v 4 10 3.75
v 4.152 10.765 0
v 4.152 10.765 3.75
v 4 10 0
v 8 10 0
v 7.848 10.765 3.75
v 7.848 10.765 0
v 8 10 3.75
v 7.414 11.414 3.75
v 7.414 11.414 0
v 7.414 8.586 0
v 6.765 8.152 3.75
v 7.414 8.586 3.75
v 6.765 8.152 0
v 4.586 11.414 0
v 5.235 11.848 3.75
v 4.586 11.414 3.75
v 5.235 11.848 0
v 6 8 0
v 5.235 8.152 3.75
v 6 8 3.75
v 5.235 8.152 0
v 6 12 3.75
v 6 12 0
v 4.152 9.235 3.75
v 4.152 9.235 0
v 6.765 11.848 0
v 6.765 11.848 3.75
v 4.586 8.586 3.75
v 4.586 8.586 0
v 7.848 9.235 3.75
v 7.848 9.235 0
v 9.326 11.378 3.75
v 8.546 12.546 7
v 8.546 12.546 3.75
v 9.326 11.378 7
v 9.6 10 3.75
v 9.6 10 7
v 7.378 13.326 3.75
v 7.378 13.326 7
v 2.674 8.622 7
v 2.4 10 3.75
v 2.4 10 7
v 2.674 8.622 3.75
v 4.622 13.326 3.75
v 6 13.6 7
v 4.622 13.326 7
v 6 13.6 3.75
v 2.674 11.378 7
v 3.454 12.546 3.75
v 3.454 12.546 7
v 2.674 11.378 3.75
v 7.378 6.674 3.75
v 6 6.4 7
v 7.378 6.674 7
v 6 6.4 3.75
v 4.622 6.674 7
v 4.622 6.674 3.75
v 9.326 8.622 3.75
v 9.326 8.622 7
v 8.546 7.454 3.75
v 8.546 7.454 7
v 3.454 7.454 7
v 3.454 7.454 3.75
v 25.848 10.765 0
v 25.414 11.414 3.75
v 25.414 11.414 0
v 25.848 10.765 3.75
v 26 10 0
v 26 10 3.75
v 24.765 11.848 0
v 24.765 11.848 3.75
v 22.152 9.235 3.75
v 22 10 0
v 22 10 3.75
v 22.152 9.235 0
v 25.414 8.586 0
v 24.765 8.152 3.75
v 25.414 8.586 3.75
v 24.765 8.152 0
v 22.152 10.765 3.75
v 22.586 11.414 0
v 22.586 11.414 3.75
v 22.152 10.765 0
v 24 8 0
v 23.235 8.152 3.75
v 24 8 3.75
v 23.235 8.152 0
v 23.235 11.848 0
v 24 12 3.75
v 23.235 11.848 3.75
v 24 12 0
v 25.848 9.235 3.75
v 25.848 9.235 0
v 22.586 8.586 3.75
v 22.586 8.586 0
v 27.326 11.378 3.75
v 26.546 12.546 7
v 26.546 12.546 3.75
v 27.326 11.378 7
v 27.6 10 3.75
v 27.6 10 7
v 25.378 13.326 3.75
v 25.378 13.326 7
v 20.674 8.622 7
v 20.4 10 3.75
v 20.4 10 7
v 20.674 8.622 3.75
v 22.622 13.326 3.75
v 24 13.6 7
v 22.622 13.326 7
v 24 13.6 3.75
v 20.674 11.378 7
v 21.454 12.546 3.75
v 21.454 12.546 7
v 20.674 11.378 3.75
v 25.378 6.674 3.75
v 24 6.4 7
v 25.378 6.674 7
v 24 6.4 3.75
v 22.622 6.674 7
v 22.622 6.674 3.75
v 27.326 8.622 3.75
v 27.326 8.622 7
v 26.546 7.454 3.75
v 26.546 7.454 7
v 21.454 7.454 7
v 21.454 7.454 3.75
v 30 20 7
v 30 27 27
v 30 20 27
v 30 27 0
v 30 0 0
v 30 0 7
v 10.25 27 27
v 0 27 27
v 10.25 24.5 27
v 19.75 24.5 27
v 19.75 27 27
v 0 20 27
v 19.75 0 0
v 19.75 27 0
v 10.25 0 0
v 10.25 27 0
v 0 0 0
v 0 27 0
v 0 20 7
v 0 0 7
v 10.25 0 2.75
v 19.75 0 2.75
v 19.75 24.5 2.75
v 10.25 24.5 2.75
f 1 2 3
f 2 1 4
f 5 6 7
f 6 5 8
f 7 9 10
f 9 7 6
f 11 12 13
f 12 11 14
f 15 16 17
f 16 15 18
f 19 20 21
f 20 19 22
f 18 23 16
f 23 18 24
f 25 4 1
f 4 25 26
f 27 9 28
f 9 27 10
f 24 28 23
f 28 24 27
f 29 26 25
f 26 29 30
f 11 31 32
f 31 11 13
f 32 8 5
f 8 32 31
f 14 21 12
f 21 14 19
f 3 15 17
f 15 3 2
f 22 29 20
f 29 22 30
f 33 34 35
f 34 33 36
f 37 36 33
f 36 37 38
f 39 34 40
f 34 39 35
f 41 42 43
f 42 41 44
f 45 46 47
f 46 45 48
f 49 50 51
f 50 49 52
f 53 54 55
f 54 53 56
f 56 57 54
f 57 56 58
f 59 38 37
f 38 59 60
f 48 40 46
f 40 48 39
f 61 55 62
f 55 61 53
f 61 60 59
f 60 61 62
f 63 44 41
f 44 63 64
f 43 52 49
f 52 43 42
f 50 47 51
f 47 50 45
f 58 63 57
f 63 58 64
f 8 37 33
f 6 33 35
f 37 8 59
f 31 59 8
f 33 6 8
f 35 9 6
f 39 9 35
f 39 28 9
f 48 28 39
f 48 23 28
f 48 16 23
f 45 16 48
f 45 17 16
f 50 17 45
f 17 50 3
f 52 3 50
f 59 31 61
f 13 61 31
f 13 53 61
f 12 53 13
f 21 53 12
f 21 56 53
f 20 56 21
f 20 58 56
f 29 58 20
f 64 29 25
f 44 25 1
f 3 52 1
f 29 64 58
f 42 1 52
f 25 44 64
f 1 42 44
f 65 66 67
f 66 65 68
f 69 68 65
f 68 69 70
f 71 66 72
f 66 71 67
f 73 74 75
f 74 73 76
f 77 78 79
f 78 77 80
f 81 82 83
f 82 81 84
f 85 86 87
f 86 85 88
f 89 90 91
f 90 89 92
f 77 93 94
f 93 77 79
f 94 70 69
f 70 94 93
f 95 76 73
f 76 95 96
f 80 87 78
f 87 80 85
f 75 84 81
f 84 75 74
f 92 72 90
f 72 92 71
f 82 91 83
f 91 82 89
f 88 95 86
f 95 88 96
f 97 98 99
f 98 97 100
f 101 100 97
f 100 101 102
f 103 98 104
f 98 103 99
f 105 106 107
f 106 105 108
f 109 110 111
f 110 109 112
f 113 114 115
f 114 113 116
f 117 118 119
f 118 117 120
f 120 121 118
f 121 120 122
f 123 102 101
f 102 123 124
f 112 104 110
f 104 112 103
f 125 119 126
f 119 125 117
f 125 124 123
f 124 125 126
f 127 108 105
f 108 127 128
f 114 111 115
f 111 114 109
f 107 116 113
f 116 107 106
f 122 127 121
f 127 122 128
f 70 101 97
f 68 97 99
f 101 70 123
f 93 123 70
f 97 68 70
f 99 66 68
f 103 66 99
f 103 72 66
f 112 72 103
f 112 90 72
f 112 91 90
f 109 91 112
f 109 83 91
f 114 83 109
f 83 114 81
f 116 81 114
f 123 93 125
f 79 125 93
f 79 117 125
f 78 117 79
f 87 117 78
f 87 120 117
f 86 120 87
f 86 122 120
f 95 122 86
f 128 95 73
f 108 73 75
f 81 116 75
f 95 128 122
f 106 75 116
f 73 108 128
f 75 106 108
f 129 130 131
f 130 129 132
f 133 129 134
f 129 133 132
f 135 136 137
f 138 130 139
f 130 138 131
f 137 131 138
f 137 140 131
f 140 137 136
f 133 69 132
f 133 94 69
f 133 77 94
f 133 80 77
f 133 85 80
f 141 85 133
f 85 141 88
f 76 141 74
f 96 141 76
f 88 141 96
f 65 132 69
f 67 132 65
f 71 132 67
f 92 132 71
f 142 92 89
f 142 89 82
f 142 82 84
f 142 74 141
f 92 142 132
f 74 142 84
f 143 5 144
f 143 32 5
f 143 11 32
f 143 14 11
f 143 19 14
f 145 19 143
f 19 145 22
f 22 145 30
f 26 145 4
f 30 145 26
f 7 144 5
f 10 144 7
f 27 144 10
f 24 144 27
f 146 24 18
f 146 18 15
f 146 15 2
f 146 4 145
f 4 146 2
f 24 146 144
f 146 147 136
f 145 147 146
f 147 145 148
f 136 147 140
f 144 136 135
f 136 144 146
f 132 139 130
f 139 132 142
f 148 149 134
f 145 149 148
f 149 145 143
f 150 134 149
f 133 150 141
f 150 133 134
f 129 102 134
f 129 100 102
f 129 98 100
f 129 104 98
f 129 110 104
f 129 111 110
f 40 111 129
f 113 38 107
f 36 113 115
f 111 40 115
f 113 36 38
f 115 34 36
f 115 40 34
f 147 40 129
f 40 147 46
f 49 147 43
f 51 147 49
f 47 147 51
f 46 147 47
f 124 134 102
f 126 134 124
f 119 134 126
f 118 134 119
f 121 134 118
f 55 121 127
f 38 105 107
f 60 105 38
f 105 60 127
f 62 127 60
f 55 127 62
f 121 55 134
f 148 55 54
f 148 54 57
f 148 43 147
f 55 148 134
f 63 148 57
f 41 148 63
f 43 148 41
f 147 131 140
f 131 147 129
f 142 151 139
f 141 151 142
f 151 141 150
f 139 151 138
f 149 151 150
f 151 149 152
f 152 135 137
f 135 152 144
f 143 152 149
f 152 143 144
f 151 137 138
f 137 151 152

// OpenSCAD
// Base is 49mm wide, 25mm deep
// Body is 39mm wide
// Tab is 16mm wide
// Locks are 6mm from back, 12mm from side, 10mm long

module screw (x, y)
{
  translate ([x, y, 0]) {
    cylinder (h=10, d=4.0, $fn=16, center=true);
  }
  translate ([x, y, 6]) {
    cylinder (h=4.5, d=7.2, $fn=16, center=true);
  }
}

translate ([0, 0, 0]) {
  difference () {
     // Floor
    cube ([30, 27, 27]);

    // Remove cube to create vertical
    translate ([0, 0, 7]) {
      cube ([30, 20, 27]);
    }

    // Tie-wrap
    translate ([10.25, 0, 0]) {
      cube ([9.5, 27, 2.75]);
    }
    translate ([10.25, 24.5, 0]) {
      cube ([9.5, 2.75, 30]);
    }
    /*
    translate ([15, 24.5, 2.5]) {
      rotate (a=90, v=[0,1,0]) {
        cylinder (h=9, d=4, $fn=16, center=true);
      }
    }
    */

    //  Screw holes & head recesses
    screw (6, 10);
    screw (24, 10);
  }
}
